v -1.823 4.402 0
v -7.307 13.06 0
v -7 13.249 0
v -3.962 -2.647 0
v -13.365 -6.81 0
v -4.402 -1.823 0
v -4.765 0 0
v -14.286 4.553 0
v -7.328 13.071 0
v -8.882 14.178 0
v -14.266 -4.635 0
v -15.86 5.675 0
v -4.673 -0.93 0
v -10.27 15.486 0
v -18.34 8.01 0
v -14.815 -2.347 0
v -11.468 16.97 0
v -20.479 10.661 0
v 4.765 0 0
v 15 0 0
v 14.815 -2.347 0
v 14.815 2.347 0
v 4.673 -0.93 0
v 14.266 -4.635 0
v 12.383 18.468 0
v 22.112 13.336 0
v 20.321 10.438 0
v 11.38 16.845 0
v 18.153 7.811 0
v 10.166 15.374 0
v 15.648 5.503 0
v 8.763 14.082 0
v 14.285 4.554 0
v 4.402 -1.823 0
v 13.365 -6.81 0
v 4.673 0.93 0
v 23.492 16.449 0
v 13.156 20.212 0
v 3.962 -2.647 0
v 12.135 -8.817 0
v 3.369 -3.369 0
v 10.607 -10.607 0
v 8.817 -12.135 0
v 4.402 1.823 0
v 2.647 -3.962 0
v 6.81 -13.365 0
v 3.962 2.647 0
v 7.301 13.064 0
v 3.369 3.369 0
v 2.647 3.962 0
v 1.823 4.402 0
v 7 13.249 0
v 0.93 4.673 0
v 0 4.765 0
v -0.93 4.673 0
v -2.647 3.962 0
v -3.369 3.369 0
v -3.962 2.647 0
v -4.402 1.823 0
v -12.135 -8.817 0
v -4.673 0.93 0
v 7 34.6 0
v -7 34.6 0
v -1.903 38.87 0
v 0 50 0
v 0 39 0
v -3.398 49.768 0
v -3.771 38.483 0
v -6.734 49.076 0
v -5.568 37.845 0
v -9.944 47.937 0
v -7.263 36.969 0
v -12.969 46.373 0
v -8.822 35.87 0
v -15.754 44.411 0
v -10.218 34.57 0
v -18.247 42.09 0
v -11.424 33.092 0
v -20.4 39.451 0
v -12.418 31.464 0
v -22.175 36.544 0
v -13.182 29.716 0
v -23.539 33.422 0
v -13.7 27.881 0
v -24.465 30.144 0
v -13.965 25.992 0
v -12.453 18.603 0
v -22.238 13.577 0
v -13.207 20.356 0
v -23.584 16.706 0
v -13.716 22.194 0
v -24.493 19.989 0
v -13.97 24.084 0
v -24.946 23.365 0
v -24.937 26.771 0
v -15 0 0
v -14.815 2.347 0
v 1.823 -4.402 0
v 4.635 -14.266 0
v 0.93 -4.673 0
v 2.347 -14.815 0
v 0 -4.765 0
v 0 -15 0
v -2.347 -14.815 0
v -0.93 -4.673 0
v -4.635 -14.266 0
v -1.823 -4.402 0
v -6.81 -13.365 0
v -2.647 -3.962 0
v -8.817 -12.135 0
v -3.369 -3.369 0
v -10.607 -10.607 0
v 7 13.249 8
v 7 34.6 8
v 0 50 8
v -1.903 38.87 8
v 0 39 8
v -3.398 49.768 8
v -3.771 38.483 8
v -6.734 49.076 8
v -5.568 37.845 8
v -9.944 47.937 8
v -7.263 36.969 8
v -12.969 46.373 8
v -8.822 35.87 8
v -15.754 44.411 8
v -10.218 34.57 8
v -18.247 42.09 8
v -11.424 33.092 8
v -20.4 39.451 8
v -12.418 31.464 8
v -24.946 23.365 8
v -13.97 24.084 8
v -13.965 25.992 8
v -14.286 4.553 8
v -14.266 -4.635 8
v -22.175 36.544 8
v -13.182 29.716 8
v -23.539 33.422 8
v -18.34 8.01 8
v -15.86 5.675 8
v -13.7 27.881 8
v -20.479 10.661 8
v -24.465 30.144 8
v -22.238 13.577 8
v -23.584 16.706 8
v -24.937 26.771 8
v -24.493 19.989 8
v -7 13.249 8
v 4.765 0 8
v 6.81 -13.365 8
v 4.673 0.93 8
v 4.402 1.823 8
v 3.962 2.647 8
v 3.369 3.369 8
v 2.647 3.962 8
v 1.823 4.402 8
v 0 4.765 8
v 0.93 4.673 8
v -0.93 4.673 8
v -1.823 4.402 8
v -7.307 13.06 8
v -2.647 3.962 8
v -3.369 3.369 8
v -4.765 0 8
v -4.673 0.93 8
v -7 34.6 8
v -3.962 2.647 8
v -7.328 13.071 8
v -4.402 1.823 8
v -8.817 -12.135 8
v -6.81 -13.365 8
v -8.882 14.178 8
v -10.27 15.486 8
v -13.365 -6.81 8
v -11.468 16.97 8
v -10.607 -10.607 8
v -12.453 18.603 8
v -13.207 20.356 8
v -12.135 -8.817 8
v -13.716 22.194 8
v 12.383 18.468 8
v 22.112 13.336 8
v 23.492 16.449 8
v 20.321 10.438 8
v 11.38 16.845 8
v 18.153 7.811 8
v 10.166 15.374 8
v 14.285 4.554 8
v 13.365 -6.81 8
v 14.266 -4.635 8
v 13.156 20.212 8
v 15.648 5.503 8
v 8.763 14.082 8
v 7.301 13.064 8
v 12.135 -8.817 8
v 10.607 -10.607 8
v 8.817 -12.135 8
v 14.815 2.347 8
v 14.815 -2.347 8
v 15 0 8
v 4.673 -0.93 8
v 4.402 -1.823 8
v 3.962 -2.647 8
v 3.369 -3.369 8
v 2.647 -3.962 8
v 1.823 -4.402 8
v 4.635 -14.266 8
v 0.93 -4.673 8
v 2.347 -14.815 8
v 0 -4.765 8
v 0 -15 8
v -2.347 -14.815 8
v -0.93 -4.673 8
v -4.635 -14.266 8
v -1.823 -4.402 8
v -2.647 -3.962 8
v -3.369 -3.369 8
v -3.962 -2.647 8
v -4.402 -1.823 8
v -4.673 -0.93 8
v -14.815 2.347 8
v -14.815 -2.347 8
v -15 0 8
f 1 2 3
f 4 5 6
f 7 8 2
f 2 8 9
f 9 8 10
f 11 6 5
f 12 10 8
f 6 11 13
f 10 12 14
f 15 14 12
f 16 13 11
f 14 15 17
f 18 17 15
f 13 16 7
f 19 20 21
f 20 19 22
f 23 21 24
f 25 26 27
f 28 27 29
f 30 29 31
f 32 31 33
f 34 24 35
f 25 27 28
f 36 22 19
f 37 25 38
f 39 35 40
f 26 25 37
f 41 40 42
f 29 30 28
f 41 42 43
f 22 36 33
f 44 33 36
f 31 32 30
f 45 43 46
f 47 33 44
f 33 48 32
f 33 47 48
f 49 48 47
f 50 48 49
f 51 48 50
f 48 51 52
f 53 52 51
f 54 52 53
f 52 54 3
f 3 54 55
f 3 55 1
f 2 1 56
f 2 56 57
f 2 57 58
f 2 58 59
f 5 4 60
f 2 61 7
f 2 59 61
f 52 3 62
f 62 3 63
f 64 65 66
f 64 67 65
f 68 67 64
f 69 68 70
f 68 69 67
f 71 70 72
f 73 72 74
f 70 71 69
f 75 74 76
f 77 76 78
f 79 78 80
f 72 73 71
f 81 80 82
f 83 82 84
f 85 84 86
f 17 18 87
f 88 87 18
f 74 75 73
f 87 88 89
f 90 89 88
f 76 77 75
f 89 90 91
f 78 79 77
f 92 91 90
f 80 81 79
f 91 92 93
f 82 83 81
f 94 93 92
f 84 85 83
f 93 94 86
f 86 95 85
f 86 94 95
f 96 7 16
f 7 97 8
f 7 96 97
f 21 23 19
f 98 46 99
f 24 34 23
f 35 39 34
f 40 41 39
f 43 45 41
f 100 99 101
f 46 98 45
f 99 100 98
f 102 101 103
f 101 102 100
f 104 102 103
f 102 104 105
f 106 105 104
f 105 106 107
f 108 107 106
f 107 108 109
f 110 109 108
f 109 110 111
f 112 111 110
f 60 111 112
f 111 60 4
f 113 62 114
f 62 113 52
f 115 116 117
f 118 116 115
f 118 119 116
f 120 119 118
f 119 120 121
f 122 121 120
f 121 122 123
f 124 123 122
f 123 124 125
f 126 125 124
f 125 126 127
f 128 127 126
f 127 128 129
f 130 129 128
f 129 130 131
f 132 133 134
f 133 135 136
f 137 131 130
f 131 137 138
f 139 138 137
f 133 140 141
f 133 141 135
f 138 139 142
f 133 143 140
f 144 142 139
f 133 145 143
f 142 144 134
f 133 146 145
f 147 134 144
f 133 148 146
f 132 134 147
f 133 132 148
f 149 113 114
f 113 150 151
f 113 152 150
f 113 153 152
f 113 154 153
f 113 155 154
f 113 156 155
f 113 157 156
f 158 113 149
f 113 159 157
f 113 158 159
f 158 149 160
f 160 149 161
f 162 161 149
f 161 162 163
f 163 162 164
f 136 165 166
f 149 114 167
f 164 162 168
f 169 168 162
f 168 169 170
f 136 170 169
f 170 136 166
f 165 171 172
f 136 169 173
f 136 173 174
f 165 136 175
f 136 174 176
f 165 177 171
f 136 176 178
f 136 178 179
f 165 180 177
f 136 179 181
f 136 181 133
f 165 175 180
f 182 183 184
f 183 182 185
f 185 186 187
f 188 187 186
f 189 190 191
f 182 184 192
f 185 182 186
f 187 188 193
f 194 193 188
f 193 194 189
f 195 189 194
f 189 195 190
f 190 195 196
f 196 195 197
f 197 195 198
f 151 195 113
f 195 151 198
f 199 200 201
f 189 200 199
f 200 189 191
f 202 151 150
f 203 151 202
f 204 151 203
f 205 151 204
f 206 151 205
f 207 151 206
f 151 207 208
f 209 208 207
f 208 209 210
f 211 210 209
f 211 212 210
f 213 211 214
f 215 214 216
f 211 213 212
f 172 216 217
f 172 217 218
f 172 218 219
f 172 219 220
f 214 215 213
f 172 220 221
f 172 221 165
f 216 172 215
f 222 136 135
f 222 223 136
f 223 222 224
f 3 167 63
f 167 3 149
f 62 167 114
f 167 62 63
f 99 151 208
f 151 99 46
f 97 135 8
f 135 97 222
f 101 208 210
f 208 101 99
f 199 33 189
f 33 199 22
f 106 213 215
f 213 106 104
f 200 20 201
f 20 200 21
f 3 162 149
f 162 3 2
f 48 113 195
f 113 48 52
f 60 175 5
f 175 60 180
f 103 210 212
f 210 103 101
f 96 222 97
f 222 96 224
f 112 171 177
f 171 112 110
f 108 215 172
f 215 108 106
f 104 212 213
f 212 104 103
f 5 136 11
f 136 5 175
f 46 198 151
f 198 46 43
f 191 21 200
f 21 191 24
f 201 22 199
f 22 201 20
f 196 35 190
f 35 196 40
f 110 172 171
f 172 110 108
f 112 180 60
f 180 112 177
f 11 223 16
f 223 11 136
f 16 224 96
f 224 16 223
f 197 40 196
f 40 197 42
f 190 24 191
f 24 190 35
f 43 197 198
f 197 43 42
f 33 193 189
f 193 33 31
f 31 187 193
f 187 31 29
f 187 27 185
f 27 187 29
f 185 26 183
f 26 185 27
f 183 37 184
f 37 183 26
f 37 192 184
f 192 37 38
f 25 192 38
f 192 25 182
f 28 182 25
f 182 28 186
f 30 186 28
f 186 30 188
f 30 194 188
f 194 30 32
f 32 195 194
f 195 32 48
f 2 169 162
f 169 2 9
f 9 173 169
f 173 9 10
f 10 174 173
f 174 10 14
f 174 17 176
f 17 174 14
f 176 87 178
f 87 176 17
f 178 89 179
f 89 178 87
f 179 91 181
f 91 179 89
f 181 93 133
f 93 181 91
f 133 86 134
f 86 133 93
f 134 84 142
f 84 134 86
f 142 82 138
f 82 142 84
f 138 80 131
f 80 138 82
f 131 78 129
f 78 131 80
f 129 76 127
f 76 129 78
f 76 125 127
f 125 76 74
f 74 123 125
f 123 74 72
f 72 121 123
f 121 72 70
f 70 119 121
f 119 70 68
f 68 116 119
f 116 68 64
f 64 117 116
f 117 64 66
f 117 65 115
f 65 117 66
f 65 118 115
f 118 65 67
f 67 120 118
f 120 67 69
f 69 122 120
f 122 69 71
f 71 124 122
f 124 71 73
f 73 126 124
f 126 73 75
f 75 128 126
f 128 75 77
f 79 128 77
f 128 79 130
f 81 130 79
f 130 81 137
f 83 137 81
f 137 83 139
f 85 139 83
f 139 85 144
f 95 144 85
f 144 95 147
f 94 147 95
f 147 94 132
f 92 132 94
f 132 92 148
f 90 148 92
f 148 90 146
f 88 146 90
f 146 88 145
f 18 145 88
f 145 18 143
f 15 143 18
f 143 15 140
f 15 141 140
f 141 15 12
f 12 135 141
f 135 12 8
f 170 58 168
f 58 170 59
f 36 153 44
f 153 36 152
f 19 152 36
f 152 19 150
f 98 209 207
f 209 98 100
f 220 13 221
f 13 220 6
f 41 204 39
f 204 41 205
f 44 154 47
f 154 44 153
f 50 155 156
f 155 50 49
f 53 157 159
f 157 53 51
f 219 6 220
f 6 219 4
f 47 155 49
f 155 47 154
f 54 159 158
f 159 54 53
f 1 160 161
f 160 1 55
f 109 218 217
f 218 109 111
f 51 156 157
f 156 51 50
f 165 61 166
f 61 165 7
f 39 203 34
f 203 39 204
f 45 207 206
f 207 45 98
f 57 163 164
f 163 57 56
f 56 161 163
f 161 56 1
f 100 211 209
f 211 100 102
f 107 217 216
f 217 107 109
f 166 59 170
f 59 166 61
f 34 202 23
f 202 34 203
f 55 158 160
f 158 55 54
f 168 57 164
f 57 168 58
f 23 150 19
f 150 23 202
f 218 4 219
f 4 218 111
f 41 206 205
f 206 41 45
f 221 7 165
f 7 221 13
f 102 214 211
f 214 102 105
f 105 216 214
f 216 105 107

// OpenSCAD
$fn = 32;

// ----------------------------------------------------------------------
// Hook: 50 mm shank into a 14 mm curl, 8 mm thick
// ----------------------------------------------------------------------

// --- parameters (mm) ---
shank_len = 50;           // shank length from the boss centre
shank_w = 14;             // shank width
boss_d = 30;              // boss diameter
bore_d = 9.53;            // boss bore
curl_in = 14;             // curl inner radius
curl_out = 25;            // curl outer radius
curl_sweep = 250;         // curl sweep angle
hook_t = 8;               // hook thickness

shank_profile = [[-7, 34.6], [7, 34.6], [7, 13], [-7, 13]];
boss_profile = [[15, 0], [14.815, 2.347], [14.266, 4.635], [13.365, 6.81], [12.135, 8.817], [10.607, 10.607], [8.817, 12.135], [6.81, 13.365], [4.635, 14.266], [2.347, 14.815], [0, 15], [-2.347, 14.815], [-4.635, 14.266], [-6.81, 13.365], [-8.817, 12.135], [-10.607, 10.607], [-12.135, 8.817], [-13.365, 6.81], [-14.266, 4.635], [-14.815, 2.347], [-15, 0], [-14.815, -2.347], [-14.266, -4.635], [-13.365, -6.81], [-12.135, -8.817], [-10.607, -10.607], [-8.817, -12.135], [-6.81, -13.365], [-4.635, -14.266], [-2.347, -14.815], [0, -15], [2.347, -14.815], [4.635, -14.266], [6.81, -13.365], [8.817, -12.135], [10.607, -10.607], [12.135, -8.817], [13.365, -6.81], [14.266, -4.635], [14.815, -2.347]];
curl_profile = [[0, 50], [-3.398, 49.768], [-6.734, 49.076], [-9.944, 47.937], [-12.969, 46.373], [-15.754, 44.411], [-18.247, 42.09], [-20.4, 39.451], [-22.175, 36.544], [-23.539, 33.422], [-24.465, 30.144], [-24.937, 26.771], [-24.946, 23.365], [-24.493, 19.989], [-23.584, 16.706], [-22.238, 13.577], [-20.479, 10.661], [-18.34, 8.01], [-15.86, 5.675], [-13.086, 3.698], [-10.069, 2.117], [-6.865, 0.961], [-3.533, 0.251], [-0.136, 0], [3.263, 0.214], [6.602, 0.888], [9.818, 2.009], [12.853, 3.557], [15.648, 5.503], [18.153, 7.811], [20.321, 10.438], [22.112, 13.336], [23.492, 16.449], [13.156, 20.212], [12.383, 18.468], [11.38, 16.845], [10.166, 15.374], [8.763, 14.082], [7.197, 12.992], [5.498, 12.125], [3.697, 11.497], [1.827, 11.12], [-0.076, 11], [-1.979, 11.141], [-3.844, 11.538], [-5.638, 12.186], [-7.328, 13.071], [-8.882, 14.178], [-10.27, 15.486], [-11.468, 16.97], [-12.453, 18.603], [-13.207, 20.356], [-13.716, 22.194], [-13.97, 24.084], [-13.965, 25.992], [-13.7, 27.881], [-13.182, 29.716], [-12.418, 31.464], [-11.424, 33.092], [-10.218, 34.57], [-8.822, 35.87], [-7.263, 36.969], [-5.568, 37.845], [-3.771, 38.483], [-1.903, 38.87], [0, 39]];

difference() {
  union() {
    /* three overlapping outlines: shank, boss and the smooth curl */
    linear_extrude(height = hook_t) polygon(shank_profile);
    linear_extrude(height = hook_t) polygon(boss_profile);
    linear_extrude(height = hook_t) polygon(curl_profile);
  }
  translate([0, 0, -2.5]) cylinder(h = hook_t + 5, d = bore_d);
}
